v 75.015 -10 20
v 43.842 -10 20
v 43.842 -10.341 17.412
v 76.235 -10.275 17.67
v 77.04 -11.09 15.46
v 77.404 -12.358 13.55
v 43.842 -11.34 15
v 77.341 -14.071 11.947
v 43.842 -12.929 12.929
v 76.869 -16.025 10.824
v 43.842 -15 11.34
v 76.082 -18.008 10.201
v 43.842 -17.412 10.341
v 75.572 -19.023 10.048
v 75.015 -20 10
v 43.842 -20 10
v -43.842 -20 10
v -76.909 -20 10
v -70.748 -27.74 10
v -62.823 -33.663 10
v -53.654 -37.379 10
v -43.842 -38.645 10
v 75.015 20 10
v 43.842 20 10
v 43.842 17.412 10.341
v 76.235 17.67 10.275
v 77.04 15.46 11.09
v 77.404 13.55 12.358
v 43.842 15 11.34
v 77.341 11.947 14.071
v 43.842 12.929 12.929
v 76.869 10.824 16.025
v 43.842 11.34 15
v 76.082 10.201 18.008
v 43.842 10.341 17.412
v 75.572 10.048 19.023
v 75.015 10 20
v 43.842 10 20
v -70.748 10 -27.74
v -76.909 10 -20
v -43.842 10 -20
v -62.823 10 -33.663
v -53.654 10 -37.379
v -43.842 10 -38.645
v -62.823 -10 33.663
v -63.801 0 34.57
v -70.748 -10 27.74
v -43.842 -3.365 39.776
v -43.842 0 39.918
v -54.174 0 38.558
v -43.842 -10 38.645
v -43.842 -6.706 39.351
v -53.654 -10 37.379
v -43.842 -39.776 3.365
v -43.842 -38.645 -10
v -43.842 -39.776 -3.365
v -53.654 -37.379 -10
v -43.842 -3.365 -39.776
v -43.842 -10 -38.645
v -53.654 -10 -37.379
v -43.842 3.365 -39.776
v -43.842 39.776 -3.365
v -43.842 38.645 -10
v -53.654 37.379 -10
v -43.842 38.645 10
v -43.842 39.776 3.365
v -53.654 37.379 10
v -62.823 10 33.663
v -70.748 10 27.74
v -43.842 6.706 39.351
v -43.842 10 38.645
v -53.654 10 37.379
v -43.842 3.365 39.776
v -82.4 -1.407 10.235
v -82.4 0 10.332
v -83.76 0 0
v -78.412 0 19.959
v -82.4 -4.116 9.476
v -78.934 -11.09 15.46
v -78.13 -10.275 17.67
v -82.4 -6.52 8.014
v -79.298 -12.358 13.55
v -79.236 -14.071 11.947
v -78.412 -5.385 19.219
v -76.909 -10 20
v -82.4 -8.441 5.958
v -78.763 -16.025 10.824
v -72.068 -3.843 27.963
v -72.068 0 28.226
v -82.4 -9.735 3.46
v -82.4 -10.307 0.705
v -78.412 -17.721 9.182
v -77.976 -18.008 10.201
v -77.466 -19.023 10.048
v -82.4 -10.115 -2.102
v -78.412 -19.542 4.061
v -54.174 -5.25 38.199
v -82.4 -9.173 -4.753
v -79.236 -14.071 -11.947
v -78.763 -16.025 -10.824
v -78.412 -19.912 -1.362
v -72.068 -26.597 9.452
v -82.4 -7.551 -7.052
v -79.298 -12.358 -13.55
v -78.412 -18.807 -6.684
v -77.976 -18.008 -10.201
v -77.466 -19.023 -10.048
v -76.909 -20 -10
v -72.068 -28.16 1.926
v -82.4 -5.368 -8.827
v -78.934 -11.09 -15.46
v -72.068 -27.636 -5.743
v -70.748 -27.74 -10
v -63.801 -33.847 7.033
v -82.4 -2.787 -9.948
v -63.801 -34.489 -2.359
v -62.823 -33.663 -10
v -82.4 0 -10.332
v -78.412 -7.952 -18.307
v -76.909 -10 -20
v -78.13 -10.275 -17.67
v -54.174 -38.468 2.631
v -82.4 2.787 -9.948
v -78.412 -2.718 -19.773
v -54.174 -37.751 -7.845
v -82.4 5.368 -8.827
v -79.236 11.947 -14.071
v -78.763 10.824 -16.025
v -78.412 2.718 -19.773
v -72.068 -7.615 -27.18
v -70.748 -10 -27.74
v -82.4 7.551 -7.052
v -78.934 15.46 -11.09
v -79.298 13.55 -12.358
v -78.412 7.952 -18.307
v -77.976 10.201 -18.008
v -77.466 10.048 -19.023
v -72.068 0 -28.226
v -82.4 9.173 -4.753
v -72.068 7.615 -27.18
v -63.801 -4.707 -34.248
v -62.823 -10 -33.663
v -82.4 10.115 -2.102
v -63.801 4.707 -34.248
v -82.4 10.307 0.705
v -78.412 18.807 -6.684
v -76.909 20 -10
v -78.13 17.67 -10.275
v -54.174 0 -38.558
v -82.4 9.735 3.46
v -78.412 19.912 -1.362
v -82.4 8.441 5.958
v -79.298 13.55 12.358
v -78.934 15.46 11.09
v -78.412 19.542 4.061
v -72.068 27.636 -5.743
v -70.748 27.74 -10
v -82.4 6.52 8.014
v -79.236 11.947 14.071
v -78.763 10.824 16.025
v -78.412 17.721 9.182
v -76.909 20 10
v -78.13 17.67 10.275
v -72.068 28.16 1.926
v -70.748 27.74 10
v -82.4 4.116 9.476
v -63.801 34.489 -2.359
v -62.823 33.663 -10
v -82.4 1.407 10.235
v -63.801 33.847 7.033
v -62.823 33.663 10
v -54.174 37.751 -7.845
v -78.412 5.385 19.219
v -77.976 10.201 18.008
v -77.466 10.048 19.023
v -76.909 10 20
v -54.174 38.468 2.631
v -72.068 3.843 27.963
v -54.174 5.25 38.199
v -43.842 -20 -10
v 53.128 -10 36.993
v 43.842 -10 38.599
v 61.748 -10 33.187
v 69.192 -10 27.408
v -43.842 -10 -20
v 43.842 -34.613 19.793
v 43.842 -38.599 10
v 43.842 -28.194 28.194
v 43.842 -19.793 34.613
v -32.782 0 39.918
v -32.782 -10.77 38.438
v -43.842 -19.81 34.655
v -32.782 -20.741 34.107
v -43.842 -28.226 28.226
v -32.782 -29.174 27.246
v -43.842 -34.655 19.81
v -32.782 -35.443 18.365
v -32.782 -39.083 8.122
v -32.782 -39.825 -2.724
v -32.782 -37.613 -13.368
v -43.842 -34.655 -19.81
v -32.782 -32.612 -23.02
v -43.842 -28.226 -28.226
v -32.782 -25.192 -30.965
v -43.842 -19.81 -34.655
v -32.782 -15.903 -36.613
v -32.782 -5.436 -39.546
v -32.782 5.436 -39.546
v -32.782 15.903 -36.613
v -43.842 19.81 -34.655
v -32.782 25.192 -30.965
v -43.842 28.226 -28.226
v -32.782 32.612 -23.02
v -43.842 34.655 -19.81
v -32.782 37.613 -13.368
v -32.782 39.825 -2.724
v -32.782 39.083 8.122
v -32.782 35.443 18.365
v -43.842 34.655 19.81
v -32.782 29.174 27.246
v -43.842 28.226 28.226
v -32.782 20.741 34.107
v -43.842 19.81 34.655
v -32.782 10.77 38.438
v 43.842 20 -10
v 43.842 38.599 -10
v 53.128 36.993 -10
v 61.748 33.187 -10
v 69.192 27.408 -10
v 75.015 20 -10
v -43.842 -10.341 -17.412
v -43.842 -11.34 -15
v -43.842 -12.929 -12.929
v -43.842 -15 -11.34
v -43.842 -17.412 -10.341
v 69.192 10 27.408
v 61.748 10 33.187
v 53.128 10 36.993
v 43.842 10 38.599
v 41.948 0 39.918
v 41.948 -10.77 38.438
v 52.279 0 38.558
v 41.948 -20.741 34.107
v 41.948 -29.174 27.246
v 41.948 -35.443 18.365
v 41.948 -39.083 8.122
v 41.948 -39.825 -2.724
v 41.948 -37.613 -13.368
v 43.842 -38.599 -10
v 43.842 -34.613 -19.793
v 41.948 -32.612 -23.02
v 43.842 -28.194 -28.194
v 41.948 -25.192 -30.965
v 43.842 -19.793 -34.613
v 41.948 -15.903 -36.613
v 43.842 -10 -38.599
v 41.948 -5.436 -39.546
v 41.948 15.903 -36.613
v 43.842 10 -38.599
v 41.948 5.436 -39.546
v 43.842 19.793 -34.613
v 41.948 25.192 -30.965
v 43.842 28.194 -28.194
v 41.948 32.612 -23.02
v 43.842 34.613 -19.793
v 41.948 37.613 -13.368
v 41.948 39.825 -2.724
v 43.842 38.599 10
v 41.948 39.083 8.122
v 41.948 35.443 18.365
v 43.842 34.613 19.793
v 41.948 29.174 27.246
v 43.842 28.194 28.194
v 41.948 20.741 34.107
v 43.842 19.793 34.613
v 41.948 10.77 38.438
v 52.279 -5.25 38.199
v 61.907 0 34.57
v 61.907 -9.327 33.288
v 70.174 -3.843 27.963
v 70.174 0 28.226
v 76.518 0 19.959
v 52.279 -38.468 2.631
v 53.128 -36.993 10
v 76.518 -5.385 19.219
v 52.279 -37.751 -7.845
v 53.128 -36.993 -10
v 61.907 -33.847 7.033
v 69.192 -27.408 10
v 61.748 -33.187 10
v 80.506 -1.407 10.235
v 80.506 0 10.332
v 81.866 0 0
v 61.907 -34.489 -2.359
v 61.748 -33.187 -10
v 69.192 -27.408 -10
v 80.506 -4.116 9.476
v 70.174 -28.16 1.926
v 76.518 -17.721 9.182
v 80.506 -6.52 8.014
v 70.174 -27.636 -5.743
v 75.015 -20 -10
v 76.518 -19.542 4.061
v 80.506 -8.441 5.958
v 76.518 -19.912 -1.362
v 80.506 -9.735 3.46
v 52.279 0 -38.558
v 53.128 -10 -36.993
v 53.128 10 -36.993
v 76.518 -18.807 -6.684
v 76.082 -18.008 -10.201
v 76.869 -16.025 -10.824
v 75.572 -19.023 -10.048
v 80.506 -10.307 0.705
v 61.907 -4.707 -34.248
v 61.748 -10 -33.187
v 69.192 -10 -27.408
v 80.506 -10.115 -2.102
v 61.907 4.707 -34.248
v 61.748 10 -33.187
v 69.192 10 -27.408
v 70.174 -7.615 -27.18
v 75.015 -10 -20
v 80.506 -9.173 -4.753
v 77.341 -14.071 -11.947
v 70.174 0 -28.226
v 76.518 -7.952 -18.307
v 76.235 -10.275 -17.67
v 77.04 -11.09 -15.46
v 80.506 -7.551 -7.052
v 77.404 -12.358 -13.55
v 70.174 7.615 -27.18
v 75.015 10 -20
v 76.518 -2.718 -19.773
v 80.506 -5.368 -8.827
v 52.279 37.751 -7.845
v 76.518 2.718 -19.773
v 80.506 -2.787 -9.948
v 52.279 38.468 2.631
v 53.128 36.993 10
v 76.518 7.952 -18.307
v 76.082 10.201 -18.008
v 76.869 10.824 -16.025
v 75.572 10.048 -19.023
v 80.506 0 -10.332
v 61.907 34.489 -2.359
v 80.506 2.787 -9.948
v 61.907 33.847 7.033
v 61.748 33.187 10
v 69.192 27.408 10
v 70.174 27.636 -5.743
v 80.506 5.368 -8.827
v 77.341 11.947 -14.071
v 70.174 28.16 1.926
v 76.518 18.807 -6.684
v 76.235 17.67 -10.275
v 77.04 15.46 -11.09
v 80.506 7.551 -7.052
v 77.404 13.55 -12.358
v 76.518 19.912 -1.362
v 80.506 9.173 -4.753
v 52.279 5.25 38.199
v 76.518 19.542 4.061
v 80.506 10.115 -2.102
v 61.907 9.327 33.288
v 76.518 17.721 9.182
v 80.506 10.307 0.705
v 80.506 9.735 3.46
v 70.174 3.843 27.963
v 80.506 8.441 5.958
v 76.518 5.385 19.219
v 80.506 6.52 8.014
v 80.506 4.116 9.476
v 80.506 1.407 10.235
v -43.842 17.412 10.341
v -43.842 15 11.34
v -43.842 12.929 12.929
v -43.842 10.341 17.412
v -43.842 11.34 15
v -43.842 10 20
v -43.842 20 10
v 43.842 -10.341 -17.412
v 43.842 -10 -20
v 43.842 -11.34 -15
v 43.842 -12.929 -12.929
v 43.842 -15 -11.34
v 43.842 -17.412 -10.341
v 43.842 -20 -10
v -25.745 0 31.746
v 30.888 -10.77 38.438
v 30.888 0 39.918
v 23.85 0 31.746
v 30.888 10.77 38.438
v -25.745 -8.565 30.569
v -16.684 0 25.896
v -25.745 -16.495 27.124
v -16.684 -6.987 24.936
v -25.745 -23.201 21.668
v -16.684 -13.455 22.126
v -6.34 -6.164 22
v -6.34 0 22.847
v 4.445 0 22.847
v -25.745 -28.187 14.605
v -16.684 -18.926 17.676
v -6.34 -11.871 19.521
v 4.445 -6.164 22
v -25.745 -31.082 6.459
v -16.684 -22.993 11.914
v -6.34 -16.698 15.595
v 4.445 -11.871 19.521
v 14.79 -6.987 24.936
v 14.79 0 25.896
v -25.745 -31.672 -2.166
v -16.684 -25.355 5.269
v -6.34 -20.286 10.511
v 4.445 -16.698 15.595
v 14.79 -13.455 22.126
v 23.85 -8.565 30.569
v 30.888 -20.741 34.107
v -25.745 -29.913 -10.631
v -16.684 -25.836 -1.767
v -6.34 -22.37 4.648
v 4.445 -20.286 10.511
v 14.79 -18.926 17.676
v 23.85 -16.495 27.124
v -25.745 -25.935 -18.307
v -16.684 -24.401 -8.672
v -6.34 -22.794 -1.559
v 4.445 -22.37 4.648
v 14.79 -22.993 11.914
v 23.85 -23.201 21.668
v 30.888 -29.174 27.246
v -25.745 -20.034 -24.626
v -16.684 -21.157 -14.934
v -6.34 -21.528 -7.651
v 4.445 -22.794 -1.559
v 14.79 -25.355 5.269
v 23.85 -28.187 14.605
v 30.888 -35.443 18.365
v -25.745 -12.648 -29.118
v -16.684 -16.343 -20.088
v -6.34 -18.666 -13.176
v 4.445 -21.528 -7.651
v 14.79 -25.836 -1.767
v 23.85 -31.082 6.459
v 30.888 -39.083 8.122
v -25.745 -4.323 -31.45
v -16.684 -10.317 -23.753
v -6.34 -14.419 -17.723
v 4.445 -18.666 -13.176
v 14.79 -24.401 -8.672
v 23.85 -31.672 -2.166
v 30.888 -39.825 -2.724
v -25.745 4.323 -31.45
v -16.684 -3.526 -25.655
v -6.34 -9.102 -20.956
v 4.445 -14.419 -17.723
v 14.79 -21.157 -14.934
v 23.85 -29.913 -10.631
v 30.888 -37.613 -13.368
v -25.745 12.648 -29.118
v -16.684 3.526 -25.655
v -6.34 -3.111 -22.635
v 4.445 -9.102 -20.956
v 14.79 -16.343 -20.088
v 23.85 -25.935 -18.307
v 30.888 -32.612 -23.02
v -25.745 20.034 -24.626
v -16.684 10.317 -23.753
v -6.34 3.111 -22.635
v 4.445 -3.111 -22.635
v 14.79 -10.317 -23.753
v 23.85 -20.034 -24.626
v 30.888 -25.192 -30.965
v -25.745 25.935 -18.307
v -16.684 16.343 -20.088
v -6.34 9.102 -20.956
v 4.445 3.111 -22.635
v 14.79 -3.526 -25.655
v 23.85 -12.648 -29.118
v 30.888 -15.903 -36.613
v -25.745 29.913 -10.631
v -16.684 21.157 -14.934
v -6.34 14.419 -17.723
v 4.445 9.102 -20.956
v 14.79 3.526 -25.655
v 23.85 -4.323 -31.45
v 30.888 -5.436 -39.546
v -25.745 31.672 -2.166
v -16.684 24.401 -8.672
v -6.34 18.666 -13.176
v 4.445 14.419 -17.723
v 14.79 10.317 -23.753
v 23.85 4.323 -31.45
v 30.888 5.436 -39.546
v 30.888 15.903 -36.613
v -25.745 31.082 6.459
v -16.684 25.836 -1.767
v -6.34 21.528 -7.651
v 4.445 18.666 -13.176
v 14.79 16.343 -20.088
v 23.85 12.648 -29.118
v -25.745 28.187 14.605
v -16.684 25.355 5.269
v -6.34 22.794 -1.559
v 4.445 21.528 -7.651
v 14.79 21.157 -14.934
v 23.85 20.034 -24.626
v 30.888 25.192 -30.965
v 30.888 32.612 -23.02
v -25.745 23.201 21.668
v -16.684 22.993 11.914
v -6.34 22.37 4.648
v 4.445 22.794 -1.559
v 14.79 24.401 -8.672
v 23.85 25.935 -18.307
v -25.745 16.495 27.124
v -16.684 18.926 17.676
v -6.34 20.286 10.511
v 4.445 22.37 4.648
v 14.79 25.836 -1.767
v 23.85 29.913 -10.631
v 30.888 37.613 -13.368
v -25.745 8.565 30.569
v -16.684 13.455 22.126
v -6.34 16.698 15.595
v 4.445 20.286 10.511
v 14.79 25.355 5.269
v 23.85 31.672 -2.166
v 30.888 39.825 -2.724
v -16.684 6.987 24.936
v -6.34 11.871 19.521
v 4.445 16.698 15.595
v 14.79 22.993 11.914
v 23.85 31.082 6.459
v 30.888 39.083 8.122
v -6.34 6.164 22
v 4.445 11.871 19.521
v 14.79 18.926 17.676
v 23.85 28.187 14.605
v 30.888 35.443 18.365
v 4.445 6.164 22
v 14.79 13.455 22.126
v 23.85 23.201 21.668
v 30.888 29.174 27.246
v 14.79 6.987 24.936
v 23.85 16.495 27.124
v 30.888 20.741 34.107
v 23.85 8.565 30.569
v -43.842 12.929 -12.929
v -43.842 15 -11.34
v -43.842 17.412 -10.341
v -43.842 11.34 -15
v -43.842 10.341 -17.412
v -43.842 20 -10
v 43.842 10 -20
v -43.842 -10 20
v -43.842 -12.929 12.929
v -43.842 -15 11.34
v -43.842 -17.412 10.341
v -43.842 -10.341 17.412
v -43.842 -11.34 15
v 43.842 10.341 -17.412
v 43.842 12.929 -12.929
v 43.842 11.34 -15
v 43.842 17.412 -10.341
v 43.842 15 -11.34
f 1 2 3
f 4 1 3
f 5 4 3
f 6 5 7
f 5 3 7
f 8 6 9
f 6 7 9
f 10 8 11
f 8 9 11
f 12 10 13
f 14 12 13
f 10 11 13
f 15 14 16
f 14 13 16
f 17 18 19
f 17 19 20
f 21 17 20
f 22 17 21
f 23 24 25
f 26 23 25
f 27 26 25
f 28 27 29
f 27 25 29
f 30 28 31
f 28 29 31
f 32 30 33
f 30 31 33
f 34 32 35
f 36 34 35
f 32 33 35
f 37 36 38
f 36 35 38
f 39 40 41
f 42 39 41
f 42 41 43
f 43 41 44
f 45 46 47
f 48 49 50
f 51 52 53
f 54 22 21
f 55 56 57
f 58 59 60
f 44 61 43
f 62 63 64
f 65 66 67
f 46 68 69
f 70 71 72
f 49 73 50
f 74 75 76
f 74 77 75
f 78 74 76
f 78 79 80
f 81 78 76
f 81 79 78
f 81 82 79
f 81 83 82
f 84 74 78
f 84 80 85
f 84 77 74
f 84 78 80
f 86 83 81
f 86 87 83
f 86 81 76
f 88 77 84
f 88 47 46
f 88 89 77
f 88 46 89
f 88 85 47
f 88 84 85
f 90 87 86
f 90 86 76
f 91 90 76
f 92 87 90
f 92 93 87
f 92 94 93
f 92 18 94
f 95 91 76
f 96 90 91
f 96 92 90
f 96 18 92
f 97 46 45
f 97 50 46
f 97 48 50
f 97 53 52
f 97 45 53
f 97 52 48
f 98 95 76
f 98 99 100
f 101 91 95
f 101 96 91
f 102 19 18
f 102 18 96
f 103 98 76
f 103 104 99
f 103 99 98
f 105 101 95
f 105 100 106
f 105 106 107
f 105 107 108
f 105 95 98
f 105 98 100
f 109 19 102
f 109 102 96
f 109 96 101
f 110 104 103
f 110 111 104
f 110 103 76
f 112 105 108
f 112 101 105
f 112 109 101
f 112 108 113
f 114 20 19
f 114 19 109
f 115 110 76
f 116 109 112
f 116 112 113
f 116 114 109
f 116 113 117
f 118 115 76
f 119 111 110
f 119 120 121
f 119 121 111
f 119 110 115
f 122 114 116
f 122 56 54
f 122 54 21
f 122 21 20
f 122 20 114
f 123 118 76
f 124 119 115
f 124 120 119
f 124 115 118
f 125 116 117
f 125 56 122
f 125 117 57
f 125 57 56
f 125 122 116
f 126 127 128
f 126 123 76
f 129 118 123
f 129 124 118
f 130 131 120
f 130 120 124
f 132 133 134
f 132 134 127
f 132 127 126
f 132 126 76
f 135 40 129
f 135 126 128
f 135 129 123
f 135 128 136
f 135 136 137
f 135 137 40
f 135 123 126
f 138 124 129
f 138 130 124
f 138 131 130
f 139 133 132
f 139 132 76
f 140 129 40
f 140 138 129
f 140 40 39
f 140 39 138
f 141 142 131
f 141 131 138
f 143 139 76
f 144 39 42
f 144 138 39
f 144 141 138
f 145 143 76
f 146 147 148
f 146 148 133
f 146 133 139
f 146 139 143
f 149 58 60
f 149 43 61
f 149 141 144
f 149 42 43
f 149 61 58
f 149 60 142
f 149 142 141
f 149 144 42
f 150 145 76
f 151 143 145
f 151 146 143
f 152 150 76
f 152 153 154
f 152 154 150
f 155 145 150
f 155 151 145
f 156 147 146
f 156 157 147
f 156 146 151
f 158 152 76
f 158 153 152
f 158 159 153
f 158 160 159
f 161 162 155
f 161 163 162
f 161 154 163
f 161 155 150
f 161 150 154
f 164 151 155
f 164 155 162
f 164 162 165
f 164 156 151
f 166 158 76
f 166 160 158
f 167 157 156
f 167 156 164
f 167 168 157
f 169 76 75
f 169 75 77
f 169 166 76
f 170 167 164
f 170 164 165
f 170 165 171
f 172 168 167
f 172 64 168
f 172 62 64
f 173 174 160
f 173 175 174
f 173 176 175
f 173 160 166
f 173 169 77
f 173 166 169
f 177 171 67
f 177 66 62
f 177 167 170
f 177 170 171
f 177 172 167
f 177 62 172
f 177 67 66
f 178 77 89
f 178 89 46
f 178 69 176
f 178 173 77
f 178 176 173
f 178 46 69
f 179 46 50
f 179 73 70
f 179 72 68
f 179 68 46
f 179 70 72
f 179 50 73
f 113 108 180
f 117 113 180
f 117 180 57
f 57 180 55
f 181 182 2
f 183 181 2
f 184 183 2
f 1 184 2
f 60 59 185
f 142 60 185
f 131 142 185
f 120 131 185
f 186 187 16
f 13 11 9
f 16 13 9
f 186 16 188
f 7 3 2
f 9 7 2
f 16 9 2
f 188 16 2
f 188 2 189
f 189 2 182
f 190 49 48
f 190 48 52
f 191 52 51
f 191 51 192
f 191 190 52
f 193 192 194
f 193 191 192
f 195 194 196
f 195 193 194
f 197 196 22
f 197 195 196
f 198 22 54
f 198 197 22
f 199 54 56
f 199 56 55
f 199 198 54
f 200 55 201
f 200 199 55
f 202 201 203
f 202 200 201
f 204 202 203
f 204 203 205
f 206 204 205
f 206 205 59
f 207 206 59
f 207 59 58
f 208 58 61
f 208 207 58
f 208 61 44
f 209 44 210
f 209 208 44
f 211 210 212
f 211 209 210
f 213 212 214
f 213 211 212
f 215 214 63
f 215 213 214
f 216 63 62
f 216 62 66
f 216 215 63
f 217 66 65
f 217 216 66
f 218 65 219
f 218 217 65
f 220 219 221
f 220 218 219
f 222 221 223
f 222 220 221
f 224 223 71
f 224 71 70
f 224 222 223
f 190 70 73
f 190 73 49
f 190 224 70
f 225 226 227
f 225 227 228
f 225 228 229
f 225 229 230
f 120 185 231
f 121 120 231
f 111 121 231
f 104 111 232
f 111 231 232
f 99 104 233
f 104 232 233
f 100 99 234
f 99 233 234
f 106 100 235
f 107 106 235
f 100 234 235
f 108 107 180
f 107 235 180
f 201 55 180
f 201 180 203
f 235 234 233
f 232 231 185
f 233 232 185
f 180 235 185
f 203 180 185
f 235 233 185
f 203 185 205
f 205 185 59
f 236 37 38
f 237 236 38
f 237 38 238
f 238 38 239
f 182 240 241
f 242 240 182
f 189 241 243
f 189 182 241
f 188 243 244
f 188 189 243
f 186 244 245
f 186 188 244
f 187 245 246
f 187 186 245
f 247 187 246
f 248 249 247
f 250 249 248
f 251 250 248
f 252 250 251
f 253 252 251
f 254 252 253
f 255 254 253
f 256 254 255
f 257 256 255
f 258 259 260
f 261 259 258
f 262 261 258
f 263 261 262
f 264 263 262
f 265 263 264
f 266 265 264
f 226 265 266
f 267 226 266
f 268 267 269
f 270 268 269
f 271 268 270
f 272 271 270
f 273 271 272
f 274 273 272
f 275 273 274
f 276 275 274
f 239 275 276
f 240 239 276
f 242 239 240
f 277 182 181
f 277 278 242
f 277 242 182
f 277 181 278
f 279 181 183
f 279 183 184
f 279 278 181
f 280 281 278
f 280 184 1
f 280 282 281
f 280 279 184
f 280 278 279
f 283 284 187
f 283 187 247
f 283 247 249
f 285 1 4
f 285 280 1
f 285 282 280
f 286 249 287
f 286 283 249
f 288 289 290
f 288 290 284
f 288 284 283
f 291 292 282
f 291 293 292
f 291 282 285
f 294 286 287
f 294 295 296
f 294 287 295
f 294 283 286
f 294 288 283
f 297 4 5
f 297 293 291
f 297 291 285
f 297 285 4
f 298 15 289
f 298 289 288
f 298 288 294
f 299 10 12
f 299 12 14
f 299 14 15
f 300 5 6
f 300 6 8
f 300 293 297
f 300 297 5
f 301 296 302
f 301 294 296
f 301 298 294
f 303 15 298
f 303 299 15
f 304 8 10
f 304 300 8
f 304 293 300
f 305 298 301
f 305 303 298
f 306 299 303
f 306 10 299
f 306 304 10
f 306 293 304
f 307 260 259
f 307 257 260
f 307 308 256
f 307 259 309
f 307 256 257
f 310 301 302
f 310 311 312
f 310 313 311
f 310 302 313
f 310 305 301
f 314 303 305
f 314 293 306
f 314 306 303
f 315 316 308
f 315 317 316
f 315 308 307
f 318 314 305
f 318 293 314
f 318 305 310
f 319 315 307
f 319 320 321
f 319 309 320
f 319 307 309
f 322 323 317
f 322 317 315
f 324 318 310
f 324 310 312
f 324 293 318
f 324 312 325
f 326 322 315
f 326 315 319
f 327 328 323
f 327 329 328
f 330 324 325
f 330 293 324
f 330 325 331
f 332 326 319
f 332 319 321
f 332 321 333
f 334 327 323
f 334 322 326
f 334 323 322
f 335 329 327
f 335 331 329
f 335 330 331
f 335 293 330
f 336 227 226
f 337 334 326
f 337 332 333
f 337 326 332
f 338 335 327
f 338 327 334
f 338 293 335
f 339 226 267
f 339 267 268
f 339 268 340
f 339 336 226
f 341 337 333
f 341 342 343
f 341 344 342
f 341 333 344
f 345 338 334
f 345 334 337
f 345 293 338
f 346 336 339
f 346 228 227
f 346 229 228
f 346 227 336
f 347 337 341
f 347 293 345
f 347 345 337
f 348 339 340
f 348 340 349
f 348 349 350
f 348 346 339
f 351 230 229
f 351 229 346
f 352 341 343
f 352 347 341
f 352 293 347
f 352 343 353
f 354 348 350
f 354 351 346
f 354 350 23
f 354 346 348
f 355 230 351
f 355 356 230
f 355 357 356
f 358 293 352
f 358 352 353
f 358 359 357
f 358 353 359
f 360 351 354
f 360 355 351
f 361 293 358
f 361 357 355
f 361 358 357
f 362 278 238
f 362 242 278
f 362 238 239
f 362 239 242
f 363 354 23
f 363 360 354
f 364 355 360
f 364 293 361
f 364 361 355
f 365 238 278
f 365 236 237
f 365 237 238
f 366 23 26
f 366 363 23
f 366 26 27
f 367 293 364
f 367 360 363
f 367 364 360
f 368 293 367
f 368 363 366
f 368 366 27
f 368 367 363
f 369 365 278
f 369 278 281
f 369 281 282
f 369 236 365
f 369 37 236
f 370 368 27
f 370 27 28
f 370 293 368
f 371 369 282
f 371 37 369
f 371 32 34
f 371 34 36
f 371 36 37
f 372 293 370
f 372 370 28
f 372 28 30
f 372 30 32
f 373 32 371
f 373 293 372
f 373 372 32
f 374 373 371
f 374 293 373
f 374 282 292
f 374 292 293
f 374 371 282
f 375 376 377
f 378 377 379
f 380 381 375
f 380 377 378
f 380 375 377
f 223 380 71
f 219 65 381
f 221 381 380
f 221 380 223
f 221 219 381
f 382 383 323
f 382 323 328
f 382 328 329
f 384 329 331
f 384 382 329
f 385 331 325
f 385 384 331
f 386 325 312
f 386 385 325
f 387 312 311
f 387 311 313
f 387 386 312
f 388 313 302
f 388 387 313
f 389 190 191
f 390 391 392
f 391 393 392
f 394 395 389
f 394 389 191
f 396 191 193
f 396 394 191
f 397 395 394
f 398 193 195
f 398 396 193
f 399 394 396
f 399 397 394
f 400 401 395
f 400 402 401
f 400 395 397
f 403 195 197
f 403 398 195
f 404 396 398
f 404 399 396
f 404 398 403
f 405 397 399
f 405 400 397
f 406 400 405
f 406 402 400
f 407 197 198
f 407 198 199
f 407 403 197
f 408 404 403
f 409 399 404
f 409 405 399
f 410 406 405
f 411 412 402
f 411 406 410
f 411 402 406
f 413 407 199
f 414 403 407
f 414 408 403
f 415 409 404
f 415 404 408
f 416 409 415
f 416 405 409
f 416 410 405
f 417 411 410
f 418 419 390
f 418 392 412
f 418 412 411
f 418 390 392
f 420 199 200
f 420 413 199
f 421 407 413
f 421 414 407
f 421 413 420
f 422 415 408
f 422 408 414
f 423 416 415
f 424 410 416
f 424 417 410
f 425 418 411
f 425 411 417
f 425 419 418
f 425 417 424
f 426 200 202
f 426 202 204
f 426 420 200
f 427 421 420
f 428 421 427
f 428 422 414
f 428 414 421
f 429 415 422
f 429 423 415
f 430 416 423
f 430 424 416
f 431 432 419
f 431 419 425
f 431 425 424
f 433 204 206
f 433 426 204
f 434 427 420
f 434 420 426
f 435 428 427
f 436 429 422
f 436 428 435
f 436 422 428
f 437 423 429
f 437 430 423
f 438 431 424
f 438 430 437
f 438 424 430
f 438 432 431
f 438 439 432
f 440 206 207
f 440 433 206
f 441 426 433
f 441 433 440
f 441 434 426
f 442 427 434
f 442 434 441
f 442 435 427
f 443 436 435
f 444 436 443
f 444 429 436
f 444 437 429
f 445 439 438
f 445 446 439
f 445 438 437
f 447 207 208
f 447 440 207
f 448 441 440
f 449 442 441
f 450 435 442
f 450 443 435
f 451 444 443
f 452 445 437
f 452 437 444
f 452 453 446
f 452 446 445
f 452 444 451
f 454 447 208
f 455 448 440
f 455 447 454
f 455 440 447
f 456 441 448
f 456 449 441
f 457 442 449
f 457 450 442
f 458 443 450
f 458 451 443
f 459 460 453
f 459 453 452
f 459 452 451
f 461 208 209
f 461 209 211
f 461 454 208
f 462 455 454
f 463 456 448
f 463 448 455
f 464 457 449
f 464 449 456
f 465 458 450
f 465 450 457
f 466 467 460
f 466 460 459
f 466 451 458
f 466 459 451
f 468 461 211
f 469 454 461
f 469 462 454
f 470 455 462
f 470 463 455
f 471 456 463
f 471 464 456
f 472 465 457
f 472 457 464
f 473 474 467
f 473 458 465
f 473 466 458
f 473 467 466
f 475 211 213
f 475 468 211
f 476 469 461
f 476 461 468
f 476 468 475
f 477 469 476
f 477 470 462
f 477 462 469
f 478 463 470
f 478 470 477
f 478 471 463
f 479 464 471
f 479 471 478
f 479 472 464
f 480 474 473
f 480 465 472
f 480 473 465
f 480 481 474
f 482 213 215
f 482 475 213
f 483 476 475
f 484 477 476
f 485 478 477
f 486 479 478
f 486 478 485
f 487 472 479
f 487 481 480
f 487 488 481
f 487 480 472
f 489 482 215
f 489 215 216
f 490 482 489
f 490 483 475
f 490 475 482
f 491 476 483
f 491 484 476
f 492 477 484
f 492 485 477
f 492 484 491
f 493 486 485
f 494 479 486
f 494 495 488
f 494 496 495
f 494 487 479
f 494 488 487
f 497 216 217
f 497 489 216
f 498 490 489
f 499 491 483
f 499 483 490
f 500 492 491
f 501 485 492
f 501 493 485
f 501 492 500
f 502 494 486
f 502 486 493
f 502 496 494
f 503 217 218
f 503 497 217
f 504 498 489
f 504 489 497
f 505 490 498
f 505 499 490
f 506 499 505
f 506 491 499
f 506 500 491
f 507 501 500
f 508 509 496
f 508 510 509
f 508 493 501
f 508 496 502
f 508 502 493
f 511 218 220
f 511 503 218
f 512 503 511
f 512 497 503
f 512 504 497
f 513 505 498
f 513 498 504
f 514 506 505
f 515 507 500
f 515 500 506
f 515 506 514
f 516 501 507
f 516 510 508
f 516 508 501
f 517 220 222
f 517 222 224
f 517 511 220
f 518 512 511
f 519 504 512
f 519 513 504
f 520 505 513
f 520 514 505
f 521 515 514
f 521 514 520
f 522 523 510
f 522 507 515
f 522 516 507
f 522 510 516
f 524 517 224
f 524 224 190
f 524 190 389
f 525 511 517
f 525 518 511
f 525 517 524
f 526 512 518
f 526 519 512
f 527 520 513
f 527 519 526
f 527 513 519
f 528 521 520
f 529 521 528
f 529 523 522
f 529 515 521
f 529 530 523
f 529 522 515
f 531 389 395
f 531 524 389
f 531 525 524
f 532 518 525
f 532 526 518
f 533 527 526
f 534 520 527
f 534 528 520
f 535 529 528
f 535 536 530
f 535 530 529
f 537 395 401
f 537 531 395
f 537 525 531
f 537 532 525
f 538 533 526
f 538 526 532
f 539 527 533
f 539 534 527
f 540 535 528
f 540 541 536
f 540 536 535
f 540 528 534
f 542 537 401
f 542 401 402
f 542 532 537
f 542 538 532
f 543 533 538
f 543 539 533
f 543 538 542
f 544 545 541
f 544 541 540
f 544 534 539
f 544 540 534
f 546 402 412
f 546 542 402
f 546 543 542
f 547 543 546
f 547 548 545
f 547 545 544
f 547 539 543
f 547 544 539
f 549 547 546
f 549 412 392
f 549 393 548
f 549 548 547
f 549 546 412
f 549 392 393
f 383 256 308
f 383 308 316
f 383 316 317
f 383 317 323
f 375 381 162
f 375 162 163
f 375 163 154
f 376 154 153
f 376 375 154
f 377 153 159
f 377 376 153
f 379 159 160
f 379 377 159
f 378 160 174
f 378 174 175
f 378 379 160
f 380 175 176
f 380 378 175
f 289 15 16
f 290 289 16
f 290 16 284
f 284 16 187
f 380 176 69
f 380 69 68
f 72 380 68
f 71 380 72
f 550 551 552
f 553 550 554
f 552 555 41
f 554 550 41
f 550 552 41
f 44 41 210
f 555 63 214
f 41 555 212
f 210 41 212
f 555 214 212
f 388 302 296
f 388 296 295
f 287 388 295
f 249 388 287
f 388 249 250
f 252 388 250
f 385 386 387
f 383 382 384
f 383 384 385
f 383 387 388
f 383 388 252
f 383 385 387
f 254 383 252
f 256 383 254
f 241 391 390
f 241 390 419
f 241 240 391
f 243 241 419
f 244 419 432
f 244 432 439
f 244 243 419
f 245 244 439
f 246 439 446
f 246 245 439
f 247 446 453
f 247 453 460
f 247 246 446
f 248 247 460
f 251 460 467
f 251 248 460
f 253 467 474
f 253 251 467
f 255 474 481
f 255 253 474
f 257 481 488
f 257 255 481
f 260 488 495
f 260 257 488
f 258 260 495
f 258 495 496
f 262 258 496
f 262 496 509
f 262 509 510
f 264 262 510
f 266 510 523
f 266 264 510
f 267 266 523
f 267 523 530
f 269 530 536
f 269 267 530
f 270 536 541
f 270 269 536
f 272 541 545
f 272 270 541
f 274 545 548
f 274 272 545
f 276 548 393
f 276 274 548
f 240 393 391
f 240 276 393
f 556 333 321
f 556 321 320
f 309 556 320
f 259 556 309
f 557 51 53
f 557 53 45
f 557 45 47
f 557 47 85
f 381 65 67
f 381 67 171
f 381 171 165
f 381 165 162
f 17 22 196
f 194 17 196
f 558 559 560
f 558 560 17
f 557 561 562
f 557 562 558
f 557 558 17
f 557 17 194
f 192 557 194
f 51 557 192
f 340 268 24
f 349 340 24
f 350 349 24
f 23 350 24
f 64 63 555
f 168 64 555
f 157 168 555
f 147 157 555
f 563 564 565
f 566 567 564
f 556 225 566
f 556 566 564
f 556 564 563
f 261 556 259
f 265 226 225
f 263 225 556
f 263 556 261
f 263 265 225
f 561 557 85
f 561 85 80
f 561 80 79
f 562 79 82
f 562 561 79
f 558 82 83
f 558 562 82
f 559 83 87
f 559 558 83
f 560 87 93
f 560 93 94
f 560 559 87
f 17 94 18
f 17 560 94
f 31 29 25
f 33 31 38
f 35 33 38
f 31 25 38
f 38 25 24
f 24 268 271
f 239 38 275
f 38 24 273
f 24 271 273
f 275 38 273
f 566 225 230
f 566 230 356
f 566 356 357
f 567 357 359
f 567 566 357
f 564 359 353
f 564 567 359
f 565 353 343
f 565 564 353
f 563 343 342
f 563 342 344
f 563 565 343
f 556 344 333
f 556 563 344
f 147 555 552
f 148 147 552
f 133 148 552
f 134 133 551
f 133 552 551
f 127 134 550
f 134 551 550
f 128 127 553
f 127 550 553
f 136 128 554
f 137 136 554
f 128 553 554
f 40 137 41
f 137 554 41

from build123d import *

# Parameters (mm, degrees)
CUT_EXTRUDE1_DEPTH = 110


with BuildPart() as part:
    # Sketch1 → Revolve1 (revolve)
    with BuildSketch(Plane(origin=(0, 0, 0), x_dir=(1, 0, 0), z_dir=(0, 1, 0)), mode=Mode.PRIVATE) as revolve1_sk:
        with BuildLine():
            Line((-43.842141265, 39.917998991), (-32.781970874, 39.917998991))
            ThreePointArc((-32.781970874, 39.917998991), (-0.947206756, 22.460391682), (30.887557363, 39.917998991))
            Line((30.887557363, 39.917998991), (41.947727754, 39.917998991))
            ThreePointArc((41.947727754, 39.917998991), (70.174015532, 28.226287778), (81.865726745, 0))
            Line((81.865726745, 0), (-83.760140257, 0))
            ThreePointArc((-83.760140257, 0), (-72.068429044, 28.226287778), (-43.842141265, 39.917998991))
        make_face()
    revolve(revolve1_sk.sketch.rotate(Axis((-43.842141265, 0, 0), (1, 0, 0)), 180), axis=Axis((-43.842141265, 0, 0), (1, 0, 0)))

    # Sketch2 → Cut-Extrude1 (cut)
    with BuildSketch(Plane(origin=(-43.842141265, 0, 0), x_dir=(0, 0, -1), z_dir=(1, 0, 0))):
        with BuildLine():
            Line((-10, 38.645137385), (-10, 20))
            ThreePointArc((-10, 20), (-12.928932188, 12.928932188), (-20, 10))
            Line((-20, 10), (-38.645137385, 10))
            ThreePointArc((-38.645137385, 10), (-28.226287778, 28.226287778), (-10, 38.645137385))
        make_face()
        with BuildLine():
            Line((10, 38.645137385), (10, 20))
            ThreePointArc((10, 20), (12.928932188, 12.928932188), (20, 10))
            Line((20, 10), (38.645137385, 10))
            ThreePointArc((38.645137385, 10), (28.226287778, 28.226287778), (10, 38.645137385))
        make_face()
        with BuildLine():
            Line((-38.645137385, -10), (-20, -10))
            ThreePointArc((-20, -10), (-12.928932188, -12.928932188), (-10, -20))
            Line((-10, -20), (-10, -38.645137385))
            ThreePointArc((-10, -38.645137385), (-28.226287778, -28.226287778), (-38.645137385, -10))
        make_face()
        with BuildLine():
            Line((10, -20), (10, -38.645137385))
            ThreePointArc((10, -38.645137385), (28.226287778, -28.226287778), (38.645137385, -10))
            Line((38.645137385, -10), (20, -10))
            ThreePointArc((20, -10), (12.928932188, -12.928932188), (10, -20))
        make_face()
    cut_extrude1 = extrude(amount=-CUT_EXTRUDE1_DEPTH, mode=Mode.SUBTRACT)

    # Mirror1: Cut-Extrude1 across plane
    add(cut_extrude1.mirror(Plane(origin=(0, 0, 0), x_dir=(0, 0, 1), z_dir=(1, 0, 0))), mode=Mode.SUBTRACT)


solid = part.part
